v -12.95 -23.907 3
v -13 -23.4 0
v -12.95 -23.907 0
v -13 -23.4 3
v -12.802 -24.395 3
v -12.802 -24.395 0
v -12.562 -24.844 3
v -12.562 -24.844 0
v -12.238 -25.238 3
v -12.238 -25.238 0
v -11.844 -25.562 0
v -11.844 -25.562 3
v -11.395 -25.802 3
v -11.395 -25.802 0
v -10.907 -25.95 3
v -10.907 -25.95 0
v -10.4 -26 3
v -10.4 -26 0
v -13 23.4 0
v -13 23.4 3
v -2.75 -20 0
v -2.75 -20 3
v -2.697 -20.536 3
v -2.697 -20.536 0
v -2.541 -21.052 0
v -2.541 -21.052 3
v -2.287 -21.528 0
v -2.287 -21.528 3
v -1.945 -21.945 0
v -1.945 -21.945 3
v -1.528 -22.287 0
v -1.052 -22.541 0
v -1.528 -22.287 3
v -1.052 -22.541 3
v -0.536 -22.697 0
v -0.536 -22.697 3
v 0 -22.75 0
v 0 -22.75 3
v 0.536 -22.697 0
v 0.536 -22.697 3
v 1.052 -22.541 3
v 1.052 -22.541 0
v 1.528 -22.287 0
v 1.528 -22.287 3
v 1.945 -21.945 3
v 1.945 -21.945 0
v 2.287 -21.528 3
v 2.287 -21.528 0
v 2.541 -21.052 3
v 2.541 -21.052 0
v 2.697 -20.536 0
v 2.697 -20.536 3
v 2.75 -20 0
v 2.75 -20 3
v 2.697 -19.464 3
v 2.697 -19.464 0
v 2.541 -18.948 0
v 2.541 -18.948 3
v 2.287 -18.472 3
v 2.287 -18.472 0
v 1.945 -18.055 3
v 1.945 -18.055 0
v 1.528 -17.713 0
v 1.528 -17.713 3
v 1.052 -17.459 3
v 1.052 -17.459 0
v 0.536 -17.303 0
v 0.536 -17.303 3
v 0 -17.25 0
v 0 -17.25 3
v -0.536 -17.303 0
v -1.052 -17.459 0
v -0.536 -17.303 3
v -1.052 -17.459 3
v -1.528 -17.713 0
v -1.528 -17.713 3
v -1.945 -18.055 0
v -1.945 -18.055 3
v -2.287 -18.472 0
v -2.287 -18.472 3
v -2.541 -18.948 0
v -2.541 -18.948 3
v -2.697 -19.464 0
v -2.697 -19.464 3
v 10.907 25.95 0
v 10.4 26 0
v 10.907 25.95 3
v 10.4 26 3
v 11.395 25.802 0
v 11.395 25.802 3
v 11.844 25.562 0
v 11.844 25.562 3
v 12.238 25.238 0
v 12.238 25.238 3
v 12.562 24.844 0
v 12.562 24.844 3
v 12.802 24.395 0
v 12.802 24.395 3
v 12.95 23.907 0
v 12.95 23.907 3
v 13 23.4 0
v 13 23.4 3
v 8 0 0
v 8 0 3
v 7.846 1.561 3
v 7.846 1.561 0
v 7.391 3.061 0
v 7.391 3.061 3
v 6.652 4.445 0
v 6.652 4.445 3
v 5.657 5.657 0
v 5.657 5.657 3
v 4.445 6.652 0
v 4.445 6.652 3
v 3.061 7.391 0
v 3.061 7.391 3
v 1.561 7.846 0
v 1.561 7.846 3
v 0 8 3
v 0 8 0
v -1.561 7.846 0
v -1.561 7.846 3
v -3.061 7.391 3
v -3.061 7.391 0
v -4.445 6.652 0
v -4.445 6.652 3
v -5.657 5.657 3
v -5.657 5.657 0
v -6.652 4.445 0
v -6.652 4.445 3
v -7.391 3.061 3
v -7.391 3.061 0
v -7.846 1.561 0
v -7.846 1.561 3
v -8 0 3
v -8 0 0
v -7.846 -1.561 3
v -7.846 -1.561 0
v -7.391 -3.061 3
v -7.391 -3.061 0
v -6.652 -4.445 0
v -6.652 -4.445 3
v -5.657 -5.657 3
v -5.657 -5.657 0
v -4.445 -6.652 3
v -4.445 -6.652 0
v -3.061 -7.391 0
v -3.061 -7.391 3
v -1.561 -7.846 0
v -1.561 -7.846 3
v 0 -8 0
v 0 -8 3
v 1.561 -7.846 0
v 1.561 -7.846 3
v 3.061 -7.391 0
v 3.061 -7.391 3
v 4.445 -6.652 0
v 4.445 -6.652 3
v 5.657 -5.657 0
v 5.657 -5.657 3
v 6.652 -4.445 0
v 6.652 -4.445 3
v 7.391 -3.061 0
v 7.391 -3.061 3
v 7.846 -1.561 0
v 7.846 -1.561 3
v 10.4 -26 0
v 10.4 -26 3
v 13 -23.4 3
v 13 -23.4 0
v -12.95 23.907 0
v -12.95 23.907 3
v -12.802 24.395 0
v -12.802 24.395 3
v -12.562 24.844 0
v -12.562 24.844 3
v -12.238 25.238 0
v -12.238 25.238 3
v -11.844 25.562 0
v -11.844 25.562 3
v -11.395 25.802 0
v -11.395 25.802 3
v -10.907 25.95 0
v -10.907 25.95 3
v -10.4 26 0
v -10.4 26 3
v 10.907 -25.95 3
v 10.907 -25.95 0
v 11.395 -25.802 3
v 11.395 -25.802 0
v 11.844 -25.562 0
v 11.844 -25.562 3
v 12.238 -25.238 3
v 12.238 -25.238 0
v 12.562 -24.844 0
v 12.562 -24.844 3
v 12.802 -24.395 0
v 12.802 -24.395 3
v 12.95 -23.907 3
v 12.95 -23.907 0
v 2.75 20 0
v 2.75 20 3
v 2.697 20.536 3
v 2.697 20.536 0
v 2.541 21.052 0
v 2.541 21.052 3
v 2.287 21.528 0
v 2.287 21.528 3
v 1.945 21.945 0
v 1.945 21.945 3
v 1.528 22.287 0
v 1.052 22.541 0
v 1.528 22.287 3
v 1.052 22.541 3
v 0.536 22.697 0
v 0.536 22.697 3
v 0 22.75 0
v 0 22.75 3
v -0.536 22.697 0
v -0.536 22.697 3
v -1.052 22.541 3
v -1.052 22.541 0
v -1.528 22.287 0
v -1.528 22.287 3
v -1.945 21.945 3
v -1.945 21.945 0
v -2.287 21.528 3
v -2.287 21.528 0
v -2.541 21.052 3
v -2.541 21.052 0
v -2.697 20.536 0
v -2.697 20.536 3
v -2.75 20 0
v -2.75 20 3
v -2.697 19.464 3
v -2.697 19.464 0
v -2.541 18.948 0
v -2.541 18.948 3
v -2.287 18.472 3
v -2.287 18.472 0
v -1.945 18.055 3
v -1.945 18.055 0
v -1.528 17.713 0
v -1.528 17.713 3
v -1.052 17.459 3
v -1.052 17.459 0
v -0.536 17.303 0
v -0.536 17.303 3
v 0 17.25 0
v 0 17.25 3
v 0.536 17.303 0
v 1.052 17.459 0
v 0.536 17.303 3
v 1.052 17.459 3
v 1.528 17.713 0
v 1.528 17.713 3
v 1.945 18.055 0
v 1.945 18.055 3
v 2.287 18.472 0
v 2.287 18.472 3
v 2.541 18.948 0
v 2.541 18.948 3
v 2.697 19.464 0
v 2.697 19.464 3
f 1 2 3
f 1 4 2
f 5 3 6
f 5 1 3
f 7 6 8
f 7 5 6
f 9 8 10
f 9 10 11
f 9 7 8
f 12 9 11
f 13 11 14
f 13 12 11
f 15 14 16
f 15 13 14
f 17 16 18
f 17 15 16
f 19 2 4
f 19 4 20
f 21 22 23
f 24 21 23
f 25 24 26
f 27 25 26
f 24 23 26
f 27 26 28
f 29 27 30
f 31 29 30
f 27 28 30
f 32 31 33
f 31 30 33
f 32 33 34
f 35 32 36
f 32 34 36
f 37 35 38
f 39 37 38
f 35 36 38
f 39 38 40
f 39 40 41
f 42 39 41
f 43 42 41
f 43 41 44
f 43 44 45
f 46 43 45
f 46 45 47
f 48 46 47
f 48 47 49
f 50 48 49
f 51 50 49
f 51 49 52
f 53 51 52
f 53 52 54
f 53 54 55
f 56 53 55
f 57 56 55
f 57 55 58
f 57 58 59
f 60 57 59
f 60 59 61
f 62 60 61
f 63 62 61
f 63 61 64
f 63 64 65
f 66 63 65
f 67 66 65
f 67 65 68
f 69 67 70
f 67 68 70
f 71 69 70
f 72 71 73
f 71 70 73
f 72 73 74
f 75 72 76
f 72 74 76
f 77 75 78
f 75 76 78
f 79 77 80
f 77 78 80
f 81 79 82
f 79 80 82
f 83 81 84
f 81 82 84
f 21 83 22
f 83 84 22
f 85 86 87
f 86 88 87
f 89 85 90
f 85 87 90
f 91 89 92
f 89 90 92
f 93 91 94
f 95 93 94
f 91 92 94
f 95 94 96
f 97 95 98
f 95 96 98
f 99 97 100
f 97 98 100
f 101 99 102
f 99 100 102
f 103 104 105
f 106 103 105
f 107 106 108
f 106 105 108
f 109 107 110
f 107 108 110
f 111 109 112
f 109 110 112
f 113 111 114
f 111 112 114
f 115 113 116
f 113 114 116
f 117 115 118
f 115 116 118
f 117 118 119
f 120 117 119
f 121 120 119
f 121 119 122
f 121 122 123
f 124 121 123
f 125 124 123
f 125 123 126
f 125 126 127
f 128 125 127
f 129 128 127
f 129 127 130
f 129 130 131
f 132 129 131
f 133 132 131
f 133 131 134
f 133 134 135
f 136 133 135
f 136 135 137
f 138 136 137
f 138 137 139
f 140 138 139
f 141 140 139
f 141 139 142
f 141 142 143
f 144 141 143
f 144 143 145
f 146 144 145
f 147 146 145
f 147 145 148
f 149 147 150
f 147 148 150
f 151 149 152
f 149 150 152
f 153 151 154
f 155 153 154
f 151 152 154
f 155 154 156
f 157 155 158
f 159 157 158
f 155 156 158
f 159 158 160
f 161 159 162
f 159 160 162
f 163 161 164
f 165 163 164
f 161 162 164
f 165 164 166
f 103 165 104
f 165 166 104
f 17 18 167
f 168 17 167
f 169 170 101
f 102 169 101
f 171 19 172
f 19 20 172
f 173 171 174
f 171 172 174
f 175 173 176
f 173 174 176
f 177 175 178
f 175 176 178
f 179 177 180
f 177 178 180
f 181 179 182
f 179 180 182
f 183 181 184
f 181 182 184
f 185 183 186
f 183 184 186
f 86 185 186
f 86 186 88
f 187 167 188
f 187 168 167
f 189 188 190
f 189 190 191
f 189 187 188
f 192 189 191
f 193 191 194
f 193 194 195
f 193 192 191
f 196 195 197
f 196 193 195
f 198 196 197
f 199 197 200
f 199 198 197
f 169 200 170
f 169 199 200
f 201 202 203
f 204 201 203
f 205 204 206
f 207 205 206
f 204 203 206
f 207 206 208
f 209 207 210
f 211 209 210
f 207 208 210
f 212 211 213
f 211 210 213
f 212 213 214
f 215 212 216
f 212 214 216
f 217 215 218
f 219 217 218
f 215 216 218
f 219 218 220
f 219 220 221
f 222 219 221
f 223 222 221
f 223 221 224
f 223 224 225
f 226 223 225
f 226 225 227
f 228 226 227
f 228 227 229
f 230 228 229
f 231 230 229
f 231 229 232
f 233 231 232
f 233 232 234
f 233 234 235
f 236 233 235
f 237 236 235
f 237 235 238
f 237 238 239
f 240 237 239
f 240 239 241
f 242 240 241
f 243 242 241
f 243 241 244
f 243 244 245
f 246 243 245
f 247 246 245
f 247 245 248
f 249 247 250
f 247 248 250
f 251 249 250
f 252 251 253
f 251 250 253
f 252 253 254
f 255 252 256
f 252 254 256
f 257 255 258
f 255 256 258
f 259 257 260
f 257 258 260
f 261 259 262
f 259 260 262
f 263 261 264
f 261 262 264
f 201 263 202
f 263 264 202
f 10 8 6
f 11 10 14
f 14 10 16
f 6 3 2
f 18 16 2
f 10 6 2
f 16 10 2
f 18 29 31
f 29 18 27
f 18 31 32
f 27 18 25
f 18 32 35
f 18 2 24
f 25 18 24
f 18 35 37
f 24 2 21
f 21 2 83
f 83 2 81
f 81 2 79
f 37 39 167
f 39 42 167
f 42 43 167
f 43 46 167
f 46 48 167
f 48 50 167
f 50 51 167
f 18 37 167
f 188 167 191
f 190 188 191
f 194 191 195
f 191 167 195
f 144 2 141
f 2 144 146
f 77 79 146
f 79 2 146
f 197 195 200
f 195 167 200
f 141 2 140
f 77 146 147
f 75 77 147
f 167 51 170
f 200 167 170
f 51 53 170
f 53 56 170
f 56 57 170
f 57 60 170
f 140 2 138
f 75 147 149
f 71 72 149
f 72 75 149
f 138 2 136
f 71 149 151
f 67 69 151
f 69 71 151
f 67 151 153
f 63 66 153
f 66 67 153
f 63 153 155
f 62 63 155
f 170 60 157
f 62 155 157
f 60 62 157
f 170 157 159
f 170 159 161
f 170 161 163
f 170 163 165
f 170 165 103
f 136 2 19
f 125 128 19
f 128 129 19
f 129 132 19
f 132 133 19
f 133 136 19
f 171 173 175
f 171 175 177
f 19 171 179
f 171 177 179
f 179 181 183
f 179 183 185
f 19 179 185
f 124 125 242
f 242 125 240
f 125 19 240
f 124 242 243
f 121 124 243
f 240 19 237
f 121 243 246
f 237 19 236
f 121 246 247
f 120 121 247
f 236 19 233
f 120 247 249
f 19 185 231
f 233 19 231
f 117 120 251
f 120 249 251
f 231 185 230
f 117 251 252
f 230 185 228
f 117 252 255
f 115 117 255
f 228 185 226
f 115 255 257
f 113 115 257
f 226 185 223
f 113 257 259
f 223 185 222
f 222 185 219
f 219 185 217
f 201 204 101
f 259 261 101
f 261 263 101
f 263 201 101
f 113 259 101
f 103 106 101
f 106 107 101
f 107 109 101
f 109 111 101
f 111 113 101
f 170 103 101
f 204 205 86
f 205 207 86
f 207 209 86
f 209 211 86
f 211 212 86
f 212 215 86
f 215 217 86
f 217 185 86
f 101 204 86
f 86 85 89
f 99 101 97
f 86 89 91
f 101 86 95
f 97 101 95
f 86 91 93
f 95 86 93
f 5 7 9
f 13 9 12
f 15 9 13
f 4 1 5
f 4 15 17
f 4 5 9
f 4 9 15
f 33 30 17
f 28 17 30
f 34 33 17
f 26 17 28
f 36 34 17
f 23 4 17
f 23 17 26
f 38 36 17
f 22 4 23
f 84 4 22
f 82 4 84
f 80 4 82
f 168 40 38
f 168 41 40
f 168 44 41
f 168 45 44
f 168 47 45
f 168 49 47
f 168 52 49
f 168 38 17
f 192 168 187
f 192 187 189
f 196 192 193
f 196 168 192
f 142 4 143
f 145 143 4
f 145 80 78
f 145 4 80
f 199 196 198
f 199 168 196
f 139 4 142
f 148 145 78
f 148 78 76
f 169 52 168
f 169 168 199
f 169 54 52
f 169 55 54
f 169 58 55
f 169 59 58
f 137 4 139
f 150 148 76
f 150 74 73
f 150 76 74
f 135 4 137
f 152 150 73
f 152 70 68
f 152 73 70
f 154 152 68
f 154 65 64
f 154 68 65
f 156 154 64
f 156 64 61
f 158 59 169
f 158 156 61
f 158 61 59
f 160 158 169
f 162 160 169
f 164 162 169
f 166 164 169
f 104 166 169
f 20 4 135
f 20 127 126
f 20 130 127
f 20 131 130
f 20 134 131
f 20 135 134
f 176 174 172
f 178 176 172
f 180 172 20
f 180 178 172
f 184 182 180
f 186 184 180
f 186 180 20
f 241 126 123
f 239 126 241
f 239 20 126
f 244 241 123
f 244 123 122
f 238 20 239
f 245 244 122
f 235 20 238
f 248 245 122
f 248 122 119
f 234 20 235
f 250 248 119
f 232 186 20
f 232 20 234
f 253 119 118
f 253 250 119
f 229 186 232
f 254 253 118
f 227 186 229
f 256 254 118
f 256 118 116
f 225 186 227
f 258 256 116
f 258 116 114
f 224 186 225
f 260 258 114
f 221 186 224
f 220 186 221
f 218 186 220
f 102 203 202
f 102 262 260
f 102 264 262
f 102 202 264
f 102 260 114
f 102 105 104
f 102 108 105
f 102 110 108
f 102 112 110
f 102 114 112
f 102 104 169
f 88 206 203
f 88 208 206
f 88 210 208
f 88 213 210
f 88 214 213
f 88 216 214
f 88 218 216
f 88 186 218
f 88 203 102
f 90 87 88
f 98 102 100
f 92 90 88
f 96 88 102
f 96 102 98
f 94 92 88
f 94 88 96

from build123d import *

# Parameters (mm, degrees)
SKETCH_2_W           = 26
SKETCH_2_H           = 52
EXTRUDE_1_DEPTH      = 3
SKETCH_4_R           = 8
CUT_EXTRUDE_2_DEPTH  = 30.223278392
FILLET_1_R           = 2.6
SKETCH_3_R           = 2.75
CUT_EXTRUDE_16_DEPTH = 30.223278392


with BuildPart() as part:
    # 草图2 → 凸台-拉伸1 (new body)
    with BuildSketch(Plane.XY):
        Rectangle(SKETCH_2_W, SKETCH_2_H)
    extrude(amount=EXTRUDE_1_DEPTH)

    # 草图4 → 切除-拉伸2 (cut, through all)
    with BuildSketch(Plane.XY.offset(3)):
        Circle(SKETCH_4_R)
    extrude(amount=-CUT_EXTRUDE_2_DEPTH, mode=Mode.SUBTRACT)

    # 圆角1
    fillet_1_edges = [part.edges().sort_by_distance(p)[0] for p in [
        (-13, -26, 1.5),
        (-13, 26, 1.5),
        (13, 26, 1.5),
        (13, -26, 1.5),
    ]]
    fillet(fillet_1_edges, radius=FILLET_1_R)

    # 草图3 → 16 (cut, through all)
    with BuildSketch(Plane.XY.offset(3)):
        with Locations((0, 20)):
            Circle(SKETCH_3_R)
        with Locations(Location((0, -20, 0), (0, 0, 180))):
            Circle(SKETCH_3_R)
    extrude(amount=-CUT_EXTRUDE_16_DEPTH, mode=Mode.SUBTRACT)


solid = part.part
